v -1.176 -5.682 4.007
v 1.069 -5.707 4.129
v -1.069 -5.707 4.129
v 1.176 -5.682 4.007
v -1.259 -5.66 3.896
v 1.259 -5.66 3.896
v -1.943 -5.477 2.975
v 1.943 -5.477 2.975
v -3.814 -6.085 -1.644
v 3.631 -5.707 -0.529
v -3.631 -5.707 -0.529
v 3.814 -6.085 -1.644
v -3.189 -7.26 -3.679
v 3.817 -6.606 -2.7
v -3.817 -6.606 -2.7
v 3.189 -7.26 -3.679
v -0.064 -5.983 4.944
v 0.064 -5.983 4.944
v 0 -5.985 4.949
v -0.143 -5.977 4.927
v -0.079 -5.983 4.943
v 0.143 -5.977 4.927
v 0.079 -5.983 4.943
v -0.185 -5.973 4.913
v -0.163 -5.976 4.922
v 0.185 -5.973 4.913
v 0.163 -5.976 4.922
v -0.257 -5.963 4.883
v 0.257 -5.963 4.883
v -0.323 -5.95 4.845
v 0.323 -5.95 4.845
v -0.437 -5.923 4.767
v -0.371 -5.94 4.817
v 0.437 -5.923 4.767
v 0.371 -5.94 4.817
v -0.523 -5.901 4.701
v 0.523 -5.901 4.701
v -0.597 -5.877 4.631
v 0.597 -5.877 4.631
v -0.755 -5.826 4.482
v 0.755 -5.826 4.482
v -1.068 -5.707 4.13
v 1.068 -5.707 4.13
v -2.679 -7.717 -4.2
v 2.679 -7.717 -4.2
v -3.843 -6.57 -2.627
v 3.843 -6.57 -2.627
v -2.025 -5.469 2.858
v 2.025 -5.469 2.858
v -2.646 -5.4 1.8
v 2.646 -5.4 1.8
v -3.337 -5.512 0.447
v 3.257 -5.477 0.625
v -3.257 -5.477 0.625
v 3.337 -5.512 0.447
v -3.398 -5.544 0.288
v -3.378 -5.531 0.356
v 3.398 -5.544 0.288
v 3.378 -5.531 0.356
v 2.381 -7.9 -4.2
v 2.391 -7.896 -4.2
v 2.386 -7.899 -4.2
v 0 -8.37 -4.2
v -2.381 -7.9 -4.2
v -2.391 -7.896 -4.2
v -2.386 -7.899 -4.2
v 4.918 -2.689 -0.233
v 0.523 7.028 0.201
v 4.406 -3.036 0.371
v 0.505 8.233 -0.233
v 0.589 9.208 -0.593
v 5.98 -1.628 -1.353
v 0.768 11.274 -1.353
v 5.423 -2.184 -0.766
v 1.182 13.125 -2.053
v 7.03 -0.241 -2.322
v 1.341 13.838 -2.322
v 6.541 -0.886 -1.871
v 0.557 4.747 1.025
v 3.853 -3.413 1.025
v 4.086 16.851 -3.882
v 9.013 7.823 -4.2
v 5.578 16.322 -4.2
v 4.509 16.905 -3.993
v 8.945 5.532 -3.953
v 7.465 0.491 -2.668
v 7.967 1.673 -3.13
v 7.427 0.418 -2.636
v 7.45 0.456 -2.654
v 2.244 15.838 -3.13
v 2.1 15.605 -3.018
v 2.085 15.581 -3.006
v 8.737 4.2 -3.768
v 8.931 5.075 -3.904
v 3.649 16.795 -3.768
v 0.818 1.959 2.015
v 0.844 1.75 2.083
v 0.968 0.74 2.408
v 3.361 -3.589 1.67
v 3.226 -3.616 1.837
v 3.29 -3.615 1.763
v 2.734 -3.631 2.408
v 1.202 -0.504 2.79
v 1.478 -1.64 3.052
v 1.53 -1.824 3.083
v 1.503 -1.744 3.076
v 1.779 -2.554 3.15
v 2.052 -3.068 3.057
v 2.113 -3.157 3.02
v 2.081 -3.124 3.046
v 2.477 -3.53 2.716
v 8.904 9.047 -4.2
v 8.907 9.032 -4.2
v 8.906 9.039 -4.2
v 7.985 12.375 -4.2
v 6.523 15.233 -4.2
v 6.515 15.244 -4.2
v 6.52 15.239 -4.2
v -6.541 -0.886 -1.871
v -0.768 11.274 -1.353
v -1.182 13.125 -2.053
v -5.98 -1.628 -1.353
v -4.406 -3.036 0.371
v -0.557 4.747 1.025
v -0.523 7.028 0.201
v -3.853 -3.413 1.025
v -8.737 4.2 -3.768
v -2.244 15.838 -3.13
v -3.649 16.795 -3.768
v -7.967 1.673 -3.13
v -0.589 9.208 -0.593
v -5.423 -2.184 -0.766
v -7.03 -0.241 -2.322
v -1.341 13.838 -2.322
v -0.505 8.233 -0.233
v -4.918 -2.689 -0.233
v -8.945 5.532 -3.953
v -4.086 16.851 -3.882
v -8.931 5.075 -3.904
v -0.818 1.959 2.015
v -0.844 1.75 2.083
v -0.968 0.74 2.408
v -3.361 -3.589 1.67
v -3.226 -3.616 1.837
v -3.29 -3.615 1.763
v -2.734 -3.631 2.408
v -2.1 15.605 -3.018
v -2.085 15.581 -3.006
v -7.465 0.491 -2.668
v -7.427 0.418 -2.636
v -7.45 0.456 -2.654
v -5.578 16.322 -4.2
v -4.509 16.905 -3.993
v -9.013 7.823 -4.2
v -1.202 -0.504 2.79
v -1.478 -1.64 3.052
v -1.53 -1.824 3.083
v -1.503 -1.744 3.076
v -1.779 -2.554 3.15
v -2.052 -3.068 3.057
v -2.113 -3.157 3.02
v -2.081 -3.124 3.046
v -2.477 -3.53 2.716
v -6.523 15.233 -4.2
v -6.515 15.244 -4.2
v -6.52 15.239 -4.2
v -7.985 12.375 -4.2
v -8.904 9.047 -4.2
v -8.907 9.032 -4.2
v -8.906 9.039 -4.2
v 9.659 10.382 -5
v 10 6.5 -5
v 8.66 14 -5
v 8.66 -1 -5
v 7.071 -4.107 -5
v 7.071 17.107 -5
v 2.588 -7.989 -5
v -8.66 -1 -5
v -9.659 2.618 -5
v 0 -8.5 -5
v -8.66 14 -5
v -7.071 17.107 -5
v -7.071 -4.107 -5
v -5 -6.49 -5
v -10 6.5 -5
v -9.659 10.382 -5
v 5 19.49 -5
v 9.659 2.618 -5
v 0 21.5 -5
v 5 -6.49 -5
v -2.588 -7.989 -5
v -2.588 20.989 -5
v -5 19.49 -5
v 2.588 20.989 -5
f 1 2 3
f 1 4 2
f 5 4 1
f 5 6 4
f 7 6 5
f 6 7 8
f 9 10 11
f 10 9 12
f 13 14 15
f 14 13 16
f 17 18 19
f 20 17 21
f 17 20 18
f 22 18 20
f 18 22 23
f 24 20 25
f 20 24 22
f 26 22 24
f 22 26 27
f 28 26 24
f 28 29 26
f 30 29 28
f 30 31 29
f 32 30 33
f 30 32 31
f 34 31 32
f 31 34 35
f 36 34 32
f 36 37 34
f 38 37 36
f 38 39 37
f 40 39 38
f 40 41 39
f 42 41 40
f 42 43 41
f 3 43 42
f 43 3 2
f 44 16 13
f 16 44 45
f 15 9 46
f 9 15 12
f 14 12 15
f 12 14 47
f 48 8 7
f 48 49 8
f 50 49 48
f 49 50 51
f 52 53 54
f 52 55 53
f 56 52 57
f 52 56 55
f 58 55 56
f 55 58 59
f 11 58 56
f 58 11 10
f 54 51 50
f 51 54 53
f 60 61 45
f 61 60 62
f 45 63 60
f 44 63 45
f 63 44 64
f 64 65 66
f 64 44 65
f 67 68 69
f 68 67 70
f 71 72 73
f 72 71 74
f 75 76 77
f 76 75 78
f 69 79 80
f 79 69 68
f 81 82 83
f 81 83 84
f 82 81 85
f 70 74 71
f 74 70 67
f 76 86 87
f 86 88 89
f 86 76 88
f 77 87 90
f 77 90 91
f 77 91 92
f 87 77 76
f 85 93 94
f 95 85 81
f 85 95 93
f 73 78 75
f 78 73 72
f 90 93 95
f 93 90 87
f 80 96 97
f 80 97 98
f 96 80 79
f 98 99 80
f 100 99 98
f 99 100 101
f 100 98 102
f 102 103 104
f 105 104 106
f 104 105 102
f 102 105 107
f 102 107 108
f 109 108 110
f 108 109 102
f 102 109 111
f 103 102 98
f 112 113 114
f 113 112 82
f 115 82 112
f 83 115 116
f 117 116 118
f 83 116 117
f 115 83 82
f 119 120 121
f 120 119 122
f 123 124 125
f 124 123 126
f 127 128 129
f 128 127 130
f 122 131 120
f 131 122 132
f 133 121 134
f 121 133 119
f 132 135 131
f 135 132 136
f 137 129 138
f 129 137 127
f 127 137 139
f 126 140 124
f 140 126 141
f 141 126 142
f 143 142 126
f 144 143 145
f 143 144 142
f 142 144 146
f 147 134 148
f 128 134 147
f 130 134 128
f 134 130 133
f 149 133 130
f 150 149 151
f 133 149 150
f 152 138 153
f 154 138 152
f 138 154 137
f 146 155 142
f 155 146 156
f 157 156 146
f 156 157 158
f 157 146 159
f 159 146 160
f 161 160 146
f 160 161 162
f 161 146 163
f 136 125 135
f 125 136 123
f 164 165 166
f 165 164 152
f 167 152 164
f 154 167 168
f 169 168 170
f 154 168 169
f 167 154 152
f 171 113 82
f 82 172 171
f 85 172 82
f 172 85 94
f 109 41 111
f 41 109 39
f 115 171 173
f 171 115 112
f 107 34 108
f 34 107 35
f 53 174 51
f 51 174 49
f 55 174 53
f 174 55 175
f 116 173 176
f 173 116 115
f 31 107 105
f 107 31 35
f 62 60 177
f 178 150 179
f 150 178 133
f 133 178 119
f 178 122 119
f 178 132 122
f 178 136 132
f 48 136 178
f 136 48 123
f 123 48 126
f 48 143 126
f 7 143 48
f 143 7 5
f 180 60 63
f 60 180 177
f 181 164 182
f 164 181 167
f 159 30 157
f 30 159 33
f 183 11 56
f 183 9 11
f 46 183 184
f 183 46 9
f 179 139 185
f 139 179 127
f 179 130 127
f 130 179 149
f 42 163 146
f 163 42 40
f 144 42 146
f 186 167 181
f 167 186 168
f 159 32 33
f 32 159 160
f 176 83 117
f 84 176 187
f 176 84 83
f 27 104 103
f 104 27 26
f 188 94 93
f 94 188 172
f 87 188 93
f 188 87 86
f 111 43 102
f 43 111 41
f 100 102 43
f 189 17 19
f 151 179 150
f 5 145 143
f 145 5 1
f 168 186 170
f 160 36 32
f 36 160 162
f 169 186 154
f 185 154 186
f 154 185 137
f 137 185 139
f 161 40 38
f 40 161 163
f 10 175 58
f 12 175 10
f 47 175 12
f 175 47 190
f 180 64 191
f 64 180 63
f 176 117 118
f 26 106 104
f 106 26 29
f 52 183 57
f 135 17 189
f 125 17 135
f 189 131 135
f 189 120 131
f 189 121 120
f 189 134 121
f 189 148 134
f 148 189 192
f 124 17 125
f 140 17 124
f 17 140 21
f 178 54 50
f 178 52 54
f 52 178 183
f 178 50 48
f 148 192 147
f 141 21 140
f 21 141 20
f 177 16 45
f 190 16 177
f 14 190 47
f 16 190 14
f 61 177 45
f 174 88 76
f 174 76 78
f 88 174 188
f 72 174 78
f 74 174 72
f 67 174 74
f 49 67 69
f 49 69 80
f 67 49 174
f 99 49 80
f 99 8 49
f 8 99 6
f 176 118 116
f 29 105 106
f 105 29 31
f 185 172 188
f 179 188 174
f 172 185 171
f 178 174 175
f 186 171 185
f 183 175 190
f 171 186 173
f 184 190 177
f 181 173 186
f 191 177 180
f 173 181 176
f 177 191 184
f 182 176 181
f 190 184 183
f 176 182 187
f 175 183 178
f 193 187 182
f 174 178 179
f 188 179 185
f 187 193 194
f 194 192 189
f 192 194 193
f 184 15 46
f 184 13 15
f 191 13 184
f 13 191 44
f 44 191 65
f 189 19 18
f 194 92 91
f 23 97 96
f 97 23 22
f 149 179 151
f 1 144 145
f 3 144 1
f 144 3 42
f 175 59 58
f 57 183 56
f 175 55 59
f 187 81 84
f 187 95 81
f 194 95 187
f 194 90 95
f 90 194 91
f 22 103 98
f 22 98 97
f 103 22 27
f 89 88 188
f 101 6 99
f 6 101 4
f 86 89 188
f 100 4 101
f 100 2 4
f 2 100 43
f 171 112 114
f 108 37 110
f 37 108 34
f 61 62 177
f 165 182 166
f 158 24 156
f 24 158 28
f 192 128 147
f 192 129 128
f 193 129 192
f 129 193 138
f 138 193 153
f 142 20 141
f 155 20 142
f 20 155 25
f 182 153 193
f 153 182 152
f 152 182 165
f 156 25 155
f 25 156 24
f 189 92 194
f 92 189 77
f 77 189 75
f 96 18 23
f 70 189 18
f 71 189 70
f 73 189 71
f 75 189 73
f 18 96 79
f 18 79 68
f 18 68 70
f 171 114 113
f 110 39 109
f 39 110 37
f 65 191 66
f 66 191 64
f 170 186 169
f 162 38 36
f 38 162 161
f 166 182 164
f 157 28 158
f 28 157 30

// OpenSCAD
module body() {
   multmatrix(m = [ [1, 0, 0, 0],
                 [0, 1, -1.3, 0],
                 [0, 0, 1, 0],
                 [0, 0, 0, 1] ])
    resize([20,30,10])
       cylinder(r1=40,r2=1,h=10,center=true,$fn=24);
}

module scale() {
   
difference() {
	body();
   difference() {
	translate([0,-14.4,1.8])
     rotate([0,90,0])
       cylinder(r=9,h=20,center=true,$fn=48);
      translate([0,0,-5.2]) cube([100,100,2],center=true);
   }
   difference() {
	translate([16.1,0,12.4])
     rotate([90,0,22])
       cylinder(r=17,h=80,center=true,$fn=60);
      translate([0,0,-5.2]) cube([100,100,2],center=true);
   }
   difference() {
	 translate([-16.1,0,12.4])
     rotate([90,0,-22])
       cylinder(r=17,h=80,center=true,$fn=60);
      translate([0,0,-5.2]) cube([100,100,2],center=true);
   }
}
}

//translate([20,0,0])
//   rotate([-35,0,0])
      scale();
//translate([0,20,0]) rotate([0,45,0])   scale();
//translate([0,0,15]) rotate([0,-60,45]) scale();
